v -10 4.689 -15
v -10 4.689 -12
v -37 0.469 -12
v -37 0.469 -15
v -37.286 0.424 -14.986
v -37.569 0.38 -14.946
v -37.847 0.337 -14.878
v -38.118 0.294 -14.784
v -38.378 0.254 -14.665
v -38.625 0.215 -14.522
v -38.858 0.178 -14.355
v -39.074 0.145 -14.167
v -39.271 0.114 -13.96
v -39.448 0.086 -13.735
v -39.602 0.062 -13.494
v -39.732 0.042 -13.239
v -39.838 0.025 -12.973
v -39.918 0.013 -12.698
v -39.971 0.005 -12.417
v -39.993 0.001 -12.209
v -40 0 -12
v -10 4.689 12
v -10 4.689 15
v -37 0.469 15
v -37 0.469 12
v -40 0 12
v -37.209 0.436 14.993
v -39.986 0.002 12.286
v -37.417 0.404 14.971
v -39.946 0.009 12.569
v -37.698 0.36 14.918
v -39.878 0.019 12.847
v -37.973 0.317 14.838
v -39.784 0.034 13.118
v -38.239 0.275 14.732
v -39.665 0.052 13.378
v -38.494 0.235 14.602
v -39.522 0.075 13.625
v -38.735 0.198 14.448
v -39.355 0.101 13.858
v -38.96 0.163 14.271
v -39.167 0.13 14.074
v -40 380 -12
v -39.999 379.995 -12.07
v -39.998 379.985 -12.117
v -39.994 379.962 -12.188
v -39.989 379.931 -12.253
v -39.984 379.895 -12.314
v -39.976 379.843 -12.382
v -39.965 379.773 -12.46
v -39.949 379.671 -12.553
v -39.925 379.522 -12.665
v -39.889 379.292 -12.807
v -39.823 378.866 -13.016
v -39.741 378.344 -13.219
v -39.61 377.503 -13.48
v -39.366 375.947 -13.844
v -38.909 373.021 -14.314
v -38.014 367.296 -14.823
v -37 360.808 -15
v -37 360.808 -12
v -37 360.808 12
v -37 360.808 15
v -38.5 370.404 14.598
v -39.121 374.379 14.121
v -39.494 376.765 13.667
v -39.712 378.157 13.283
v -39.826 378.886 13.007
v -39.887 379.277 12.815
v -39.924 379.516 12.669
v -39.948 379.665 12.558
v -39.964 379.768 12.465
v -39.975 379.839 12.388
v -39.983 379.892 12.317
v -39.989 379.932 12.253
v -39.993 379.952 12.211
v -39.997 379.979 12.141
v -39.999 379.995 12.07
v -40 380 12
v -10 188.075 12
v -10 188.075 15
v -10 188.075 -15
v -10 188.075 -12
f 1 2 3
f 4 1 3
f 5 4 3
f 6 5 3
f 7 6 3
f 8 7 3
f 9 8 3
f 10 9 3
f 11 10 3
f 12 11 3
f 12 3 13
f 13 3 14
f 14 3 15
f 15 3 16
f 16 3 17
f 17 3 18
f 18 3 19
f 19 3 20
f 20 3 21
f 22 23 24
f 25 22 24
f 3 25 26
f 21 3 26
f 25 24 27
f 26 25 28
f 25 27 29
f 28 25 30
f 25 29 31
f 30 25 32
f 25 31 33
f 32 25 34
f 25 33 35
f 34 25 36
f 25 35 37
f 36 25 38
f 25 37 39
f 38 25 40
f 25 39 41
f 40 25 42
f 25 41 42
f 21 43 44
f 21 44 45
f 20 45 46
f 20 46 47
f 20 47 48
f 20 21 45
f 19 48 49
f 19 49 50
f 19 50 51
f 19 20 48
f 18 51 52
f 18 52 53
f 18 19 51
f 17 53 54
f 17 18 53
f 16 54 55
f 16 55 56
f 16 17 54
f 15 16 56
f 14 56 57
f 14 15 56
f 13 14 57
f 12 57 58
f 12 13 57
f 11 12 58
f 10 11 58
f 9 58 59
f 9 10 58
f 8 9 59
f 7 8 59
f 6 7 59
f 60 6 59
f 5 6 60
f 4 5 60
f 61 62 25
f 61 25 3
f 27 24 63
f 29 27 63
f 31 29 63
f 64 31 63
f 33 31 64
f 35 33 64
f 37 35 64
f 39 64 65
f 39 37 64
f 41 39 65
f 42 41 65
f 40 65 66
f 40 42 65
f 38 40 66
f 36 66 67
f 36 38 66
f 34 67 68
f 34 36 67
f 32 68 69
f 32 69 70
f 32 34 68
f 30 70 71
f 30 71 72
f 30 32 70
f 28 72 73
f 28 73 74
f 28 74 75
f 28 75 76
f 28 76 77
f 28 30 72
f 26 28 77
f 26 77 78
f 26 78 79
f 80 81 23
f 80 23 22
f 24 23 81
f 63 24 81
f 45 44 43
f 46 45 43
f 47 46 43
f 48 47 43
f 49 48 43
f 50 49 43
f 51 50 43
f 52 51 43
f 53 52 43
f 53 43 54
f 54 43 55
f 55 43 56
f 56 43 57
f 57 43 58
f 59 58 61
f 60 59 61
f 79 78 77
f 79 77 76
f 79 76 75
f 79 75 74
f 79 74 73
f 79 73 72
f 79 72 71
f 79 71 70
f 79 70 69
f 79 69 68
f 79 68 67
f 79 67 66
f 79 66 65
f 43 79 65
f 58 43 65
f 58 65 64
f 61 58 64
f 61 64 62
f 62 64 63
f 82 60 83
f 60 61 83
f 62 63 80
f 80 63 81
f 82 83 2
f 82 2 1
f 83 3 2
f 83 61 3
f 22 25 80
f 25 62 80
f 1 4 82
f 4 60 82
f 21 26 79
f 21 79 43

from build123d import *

# Parameters (mm, degrees)
SKETCH_1_W          = 74
SKETCH_1_H          = 24
EXTRUDE_1_DEPTH     = 380
SKETCH_2_W          = 51.146480438
SKETCH_2_H          = 42.897874587
CUT_EXTRUDE_1_DEPTH = 381
SKETCH_3_OUTSIDE_W  = 108.472
SKETCH_3_OUTSIDE_H  = 458.472
CUT_EXTRUDE_2_DEPTH = 31


with BuildPart() as part:
    # Эскиз1 → Вытянуть-Тонкостенный1 (new body)
    with BuildSketch(Plane(origin=(0, 0, 0), x_dir=(1, 0, 0), z_dir=(0, 1, 0))):
        with BuildLine():
            Line((40, 12), (40, -12))
            ThreePointArc((40, -12), (39.121320344, -14.121320344), (37, -15))
            Line((37, -15), (-37, -15))
            ThreePointArc((-37, -15), (-39.121320344, -14.121320344), (-40, -12))
            Line((-40, -12), (-40, 12))
            ThreePointArc((-40, 12), (-39.121320344, 14.121320344), (-37, 15))
            Line((-37, 15), (37, 15))
            ThreePointArc((37, 15), (39.121320344, 14.121320344), (40, 12))
        make_face()
        Rectangle(SKETCH_1_W, SKETCH_1_H, mode=Mode.SUBTRACT)
    extrude(amount=EXTRUDE_1_DEPTH)

    # Эскиз2 → Вырез-Вытянуть1 (cut, through all)
    with BuildSketch(Plane(origin=(0, 380, 0), x_dir=(1, 0, 0), z_dir=(0, 1, 0))):
        with Locations((15.573240219, -0.476163575)):
            Rectangle(SKETCH_2_W, SKETCH_2_H)
    extrude(amount=-CUT_EXTRUDE_1_DEPTH, mode=Mode.SUBTRACT)

    # Эскиз3 outside → Вырез-Вытянуть2 (cut, through all)
    with BuildSketch(Plane.XY.offset(15)):
        with Locations((-25, 190)):
            Rectangle(SKETCH_3_OUTSIDE_W, SKETCH_3_OUTSIDE_H)
        Polygon((-40, 380), (-10, 188.075345928), (-10, 4.689340222), (-40, 0), align=None, mode=Mode.SUBTRACT)
    extrude(amount=-CUT_EXTRUDE_2_DEPTH, mode=Mode.SUBTRACT)


solid = part.part
